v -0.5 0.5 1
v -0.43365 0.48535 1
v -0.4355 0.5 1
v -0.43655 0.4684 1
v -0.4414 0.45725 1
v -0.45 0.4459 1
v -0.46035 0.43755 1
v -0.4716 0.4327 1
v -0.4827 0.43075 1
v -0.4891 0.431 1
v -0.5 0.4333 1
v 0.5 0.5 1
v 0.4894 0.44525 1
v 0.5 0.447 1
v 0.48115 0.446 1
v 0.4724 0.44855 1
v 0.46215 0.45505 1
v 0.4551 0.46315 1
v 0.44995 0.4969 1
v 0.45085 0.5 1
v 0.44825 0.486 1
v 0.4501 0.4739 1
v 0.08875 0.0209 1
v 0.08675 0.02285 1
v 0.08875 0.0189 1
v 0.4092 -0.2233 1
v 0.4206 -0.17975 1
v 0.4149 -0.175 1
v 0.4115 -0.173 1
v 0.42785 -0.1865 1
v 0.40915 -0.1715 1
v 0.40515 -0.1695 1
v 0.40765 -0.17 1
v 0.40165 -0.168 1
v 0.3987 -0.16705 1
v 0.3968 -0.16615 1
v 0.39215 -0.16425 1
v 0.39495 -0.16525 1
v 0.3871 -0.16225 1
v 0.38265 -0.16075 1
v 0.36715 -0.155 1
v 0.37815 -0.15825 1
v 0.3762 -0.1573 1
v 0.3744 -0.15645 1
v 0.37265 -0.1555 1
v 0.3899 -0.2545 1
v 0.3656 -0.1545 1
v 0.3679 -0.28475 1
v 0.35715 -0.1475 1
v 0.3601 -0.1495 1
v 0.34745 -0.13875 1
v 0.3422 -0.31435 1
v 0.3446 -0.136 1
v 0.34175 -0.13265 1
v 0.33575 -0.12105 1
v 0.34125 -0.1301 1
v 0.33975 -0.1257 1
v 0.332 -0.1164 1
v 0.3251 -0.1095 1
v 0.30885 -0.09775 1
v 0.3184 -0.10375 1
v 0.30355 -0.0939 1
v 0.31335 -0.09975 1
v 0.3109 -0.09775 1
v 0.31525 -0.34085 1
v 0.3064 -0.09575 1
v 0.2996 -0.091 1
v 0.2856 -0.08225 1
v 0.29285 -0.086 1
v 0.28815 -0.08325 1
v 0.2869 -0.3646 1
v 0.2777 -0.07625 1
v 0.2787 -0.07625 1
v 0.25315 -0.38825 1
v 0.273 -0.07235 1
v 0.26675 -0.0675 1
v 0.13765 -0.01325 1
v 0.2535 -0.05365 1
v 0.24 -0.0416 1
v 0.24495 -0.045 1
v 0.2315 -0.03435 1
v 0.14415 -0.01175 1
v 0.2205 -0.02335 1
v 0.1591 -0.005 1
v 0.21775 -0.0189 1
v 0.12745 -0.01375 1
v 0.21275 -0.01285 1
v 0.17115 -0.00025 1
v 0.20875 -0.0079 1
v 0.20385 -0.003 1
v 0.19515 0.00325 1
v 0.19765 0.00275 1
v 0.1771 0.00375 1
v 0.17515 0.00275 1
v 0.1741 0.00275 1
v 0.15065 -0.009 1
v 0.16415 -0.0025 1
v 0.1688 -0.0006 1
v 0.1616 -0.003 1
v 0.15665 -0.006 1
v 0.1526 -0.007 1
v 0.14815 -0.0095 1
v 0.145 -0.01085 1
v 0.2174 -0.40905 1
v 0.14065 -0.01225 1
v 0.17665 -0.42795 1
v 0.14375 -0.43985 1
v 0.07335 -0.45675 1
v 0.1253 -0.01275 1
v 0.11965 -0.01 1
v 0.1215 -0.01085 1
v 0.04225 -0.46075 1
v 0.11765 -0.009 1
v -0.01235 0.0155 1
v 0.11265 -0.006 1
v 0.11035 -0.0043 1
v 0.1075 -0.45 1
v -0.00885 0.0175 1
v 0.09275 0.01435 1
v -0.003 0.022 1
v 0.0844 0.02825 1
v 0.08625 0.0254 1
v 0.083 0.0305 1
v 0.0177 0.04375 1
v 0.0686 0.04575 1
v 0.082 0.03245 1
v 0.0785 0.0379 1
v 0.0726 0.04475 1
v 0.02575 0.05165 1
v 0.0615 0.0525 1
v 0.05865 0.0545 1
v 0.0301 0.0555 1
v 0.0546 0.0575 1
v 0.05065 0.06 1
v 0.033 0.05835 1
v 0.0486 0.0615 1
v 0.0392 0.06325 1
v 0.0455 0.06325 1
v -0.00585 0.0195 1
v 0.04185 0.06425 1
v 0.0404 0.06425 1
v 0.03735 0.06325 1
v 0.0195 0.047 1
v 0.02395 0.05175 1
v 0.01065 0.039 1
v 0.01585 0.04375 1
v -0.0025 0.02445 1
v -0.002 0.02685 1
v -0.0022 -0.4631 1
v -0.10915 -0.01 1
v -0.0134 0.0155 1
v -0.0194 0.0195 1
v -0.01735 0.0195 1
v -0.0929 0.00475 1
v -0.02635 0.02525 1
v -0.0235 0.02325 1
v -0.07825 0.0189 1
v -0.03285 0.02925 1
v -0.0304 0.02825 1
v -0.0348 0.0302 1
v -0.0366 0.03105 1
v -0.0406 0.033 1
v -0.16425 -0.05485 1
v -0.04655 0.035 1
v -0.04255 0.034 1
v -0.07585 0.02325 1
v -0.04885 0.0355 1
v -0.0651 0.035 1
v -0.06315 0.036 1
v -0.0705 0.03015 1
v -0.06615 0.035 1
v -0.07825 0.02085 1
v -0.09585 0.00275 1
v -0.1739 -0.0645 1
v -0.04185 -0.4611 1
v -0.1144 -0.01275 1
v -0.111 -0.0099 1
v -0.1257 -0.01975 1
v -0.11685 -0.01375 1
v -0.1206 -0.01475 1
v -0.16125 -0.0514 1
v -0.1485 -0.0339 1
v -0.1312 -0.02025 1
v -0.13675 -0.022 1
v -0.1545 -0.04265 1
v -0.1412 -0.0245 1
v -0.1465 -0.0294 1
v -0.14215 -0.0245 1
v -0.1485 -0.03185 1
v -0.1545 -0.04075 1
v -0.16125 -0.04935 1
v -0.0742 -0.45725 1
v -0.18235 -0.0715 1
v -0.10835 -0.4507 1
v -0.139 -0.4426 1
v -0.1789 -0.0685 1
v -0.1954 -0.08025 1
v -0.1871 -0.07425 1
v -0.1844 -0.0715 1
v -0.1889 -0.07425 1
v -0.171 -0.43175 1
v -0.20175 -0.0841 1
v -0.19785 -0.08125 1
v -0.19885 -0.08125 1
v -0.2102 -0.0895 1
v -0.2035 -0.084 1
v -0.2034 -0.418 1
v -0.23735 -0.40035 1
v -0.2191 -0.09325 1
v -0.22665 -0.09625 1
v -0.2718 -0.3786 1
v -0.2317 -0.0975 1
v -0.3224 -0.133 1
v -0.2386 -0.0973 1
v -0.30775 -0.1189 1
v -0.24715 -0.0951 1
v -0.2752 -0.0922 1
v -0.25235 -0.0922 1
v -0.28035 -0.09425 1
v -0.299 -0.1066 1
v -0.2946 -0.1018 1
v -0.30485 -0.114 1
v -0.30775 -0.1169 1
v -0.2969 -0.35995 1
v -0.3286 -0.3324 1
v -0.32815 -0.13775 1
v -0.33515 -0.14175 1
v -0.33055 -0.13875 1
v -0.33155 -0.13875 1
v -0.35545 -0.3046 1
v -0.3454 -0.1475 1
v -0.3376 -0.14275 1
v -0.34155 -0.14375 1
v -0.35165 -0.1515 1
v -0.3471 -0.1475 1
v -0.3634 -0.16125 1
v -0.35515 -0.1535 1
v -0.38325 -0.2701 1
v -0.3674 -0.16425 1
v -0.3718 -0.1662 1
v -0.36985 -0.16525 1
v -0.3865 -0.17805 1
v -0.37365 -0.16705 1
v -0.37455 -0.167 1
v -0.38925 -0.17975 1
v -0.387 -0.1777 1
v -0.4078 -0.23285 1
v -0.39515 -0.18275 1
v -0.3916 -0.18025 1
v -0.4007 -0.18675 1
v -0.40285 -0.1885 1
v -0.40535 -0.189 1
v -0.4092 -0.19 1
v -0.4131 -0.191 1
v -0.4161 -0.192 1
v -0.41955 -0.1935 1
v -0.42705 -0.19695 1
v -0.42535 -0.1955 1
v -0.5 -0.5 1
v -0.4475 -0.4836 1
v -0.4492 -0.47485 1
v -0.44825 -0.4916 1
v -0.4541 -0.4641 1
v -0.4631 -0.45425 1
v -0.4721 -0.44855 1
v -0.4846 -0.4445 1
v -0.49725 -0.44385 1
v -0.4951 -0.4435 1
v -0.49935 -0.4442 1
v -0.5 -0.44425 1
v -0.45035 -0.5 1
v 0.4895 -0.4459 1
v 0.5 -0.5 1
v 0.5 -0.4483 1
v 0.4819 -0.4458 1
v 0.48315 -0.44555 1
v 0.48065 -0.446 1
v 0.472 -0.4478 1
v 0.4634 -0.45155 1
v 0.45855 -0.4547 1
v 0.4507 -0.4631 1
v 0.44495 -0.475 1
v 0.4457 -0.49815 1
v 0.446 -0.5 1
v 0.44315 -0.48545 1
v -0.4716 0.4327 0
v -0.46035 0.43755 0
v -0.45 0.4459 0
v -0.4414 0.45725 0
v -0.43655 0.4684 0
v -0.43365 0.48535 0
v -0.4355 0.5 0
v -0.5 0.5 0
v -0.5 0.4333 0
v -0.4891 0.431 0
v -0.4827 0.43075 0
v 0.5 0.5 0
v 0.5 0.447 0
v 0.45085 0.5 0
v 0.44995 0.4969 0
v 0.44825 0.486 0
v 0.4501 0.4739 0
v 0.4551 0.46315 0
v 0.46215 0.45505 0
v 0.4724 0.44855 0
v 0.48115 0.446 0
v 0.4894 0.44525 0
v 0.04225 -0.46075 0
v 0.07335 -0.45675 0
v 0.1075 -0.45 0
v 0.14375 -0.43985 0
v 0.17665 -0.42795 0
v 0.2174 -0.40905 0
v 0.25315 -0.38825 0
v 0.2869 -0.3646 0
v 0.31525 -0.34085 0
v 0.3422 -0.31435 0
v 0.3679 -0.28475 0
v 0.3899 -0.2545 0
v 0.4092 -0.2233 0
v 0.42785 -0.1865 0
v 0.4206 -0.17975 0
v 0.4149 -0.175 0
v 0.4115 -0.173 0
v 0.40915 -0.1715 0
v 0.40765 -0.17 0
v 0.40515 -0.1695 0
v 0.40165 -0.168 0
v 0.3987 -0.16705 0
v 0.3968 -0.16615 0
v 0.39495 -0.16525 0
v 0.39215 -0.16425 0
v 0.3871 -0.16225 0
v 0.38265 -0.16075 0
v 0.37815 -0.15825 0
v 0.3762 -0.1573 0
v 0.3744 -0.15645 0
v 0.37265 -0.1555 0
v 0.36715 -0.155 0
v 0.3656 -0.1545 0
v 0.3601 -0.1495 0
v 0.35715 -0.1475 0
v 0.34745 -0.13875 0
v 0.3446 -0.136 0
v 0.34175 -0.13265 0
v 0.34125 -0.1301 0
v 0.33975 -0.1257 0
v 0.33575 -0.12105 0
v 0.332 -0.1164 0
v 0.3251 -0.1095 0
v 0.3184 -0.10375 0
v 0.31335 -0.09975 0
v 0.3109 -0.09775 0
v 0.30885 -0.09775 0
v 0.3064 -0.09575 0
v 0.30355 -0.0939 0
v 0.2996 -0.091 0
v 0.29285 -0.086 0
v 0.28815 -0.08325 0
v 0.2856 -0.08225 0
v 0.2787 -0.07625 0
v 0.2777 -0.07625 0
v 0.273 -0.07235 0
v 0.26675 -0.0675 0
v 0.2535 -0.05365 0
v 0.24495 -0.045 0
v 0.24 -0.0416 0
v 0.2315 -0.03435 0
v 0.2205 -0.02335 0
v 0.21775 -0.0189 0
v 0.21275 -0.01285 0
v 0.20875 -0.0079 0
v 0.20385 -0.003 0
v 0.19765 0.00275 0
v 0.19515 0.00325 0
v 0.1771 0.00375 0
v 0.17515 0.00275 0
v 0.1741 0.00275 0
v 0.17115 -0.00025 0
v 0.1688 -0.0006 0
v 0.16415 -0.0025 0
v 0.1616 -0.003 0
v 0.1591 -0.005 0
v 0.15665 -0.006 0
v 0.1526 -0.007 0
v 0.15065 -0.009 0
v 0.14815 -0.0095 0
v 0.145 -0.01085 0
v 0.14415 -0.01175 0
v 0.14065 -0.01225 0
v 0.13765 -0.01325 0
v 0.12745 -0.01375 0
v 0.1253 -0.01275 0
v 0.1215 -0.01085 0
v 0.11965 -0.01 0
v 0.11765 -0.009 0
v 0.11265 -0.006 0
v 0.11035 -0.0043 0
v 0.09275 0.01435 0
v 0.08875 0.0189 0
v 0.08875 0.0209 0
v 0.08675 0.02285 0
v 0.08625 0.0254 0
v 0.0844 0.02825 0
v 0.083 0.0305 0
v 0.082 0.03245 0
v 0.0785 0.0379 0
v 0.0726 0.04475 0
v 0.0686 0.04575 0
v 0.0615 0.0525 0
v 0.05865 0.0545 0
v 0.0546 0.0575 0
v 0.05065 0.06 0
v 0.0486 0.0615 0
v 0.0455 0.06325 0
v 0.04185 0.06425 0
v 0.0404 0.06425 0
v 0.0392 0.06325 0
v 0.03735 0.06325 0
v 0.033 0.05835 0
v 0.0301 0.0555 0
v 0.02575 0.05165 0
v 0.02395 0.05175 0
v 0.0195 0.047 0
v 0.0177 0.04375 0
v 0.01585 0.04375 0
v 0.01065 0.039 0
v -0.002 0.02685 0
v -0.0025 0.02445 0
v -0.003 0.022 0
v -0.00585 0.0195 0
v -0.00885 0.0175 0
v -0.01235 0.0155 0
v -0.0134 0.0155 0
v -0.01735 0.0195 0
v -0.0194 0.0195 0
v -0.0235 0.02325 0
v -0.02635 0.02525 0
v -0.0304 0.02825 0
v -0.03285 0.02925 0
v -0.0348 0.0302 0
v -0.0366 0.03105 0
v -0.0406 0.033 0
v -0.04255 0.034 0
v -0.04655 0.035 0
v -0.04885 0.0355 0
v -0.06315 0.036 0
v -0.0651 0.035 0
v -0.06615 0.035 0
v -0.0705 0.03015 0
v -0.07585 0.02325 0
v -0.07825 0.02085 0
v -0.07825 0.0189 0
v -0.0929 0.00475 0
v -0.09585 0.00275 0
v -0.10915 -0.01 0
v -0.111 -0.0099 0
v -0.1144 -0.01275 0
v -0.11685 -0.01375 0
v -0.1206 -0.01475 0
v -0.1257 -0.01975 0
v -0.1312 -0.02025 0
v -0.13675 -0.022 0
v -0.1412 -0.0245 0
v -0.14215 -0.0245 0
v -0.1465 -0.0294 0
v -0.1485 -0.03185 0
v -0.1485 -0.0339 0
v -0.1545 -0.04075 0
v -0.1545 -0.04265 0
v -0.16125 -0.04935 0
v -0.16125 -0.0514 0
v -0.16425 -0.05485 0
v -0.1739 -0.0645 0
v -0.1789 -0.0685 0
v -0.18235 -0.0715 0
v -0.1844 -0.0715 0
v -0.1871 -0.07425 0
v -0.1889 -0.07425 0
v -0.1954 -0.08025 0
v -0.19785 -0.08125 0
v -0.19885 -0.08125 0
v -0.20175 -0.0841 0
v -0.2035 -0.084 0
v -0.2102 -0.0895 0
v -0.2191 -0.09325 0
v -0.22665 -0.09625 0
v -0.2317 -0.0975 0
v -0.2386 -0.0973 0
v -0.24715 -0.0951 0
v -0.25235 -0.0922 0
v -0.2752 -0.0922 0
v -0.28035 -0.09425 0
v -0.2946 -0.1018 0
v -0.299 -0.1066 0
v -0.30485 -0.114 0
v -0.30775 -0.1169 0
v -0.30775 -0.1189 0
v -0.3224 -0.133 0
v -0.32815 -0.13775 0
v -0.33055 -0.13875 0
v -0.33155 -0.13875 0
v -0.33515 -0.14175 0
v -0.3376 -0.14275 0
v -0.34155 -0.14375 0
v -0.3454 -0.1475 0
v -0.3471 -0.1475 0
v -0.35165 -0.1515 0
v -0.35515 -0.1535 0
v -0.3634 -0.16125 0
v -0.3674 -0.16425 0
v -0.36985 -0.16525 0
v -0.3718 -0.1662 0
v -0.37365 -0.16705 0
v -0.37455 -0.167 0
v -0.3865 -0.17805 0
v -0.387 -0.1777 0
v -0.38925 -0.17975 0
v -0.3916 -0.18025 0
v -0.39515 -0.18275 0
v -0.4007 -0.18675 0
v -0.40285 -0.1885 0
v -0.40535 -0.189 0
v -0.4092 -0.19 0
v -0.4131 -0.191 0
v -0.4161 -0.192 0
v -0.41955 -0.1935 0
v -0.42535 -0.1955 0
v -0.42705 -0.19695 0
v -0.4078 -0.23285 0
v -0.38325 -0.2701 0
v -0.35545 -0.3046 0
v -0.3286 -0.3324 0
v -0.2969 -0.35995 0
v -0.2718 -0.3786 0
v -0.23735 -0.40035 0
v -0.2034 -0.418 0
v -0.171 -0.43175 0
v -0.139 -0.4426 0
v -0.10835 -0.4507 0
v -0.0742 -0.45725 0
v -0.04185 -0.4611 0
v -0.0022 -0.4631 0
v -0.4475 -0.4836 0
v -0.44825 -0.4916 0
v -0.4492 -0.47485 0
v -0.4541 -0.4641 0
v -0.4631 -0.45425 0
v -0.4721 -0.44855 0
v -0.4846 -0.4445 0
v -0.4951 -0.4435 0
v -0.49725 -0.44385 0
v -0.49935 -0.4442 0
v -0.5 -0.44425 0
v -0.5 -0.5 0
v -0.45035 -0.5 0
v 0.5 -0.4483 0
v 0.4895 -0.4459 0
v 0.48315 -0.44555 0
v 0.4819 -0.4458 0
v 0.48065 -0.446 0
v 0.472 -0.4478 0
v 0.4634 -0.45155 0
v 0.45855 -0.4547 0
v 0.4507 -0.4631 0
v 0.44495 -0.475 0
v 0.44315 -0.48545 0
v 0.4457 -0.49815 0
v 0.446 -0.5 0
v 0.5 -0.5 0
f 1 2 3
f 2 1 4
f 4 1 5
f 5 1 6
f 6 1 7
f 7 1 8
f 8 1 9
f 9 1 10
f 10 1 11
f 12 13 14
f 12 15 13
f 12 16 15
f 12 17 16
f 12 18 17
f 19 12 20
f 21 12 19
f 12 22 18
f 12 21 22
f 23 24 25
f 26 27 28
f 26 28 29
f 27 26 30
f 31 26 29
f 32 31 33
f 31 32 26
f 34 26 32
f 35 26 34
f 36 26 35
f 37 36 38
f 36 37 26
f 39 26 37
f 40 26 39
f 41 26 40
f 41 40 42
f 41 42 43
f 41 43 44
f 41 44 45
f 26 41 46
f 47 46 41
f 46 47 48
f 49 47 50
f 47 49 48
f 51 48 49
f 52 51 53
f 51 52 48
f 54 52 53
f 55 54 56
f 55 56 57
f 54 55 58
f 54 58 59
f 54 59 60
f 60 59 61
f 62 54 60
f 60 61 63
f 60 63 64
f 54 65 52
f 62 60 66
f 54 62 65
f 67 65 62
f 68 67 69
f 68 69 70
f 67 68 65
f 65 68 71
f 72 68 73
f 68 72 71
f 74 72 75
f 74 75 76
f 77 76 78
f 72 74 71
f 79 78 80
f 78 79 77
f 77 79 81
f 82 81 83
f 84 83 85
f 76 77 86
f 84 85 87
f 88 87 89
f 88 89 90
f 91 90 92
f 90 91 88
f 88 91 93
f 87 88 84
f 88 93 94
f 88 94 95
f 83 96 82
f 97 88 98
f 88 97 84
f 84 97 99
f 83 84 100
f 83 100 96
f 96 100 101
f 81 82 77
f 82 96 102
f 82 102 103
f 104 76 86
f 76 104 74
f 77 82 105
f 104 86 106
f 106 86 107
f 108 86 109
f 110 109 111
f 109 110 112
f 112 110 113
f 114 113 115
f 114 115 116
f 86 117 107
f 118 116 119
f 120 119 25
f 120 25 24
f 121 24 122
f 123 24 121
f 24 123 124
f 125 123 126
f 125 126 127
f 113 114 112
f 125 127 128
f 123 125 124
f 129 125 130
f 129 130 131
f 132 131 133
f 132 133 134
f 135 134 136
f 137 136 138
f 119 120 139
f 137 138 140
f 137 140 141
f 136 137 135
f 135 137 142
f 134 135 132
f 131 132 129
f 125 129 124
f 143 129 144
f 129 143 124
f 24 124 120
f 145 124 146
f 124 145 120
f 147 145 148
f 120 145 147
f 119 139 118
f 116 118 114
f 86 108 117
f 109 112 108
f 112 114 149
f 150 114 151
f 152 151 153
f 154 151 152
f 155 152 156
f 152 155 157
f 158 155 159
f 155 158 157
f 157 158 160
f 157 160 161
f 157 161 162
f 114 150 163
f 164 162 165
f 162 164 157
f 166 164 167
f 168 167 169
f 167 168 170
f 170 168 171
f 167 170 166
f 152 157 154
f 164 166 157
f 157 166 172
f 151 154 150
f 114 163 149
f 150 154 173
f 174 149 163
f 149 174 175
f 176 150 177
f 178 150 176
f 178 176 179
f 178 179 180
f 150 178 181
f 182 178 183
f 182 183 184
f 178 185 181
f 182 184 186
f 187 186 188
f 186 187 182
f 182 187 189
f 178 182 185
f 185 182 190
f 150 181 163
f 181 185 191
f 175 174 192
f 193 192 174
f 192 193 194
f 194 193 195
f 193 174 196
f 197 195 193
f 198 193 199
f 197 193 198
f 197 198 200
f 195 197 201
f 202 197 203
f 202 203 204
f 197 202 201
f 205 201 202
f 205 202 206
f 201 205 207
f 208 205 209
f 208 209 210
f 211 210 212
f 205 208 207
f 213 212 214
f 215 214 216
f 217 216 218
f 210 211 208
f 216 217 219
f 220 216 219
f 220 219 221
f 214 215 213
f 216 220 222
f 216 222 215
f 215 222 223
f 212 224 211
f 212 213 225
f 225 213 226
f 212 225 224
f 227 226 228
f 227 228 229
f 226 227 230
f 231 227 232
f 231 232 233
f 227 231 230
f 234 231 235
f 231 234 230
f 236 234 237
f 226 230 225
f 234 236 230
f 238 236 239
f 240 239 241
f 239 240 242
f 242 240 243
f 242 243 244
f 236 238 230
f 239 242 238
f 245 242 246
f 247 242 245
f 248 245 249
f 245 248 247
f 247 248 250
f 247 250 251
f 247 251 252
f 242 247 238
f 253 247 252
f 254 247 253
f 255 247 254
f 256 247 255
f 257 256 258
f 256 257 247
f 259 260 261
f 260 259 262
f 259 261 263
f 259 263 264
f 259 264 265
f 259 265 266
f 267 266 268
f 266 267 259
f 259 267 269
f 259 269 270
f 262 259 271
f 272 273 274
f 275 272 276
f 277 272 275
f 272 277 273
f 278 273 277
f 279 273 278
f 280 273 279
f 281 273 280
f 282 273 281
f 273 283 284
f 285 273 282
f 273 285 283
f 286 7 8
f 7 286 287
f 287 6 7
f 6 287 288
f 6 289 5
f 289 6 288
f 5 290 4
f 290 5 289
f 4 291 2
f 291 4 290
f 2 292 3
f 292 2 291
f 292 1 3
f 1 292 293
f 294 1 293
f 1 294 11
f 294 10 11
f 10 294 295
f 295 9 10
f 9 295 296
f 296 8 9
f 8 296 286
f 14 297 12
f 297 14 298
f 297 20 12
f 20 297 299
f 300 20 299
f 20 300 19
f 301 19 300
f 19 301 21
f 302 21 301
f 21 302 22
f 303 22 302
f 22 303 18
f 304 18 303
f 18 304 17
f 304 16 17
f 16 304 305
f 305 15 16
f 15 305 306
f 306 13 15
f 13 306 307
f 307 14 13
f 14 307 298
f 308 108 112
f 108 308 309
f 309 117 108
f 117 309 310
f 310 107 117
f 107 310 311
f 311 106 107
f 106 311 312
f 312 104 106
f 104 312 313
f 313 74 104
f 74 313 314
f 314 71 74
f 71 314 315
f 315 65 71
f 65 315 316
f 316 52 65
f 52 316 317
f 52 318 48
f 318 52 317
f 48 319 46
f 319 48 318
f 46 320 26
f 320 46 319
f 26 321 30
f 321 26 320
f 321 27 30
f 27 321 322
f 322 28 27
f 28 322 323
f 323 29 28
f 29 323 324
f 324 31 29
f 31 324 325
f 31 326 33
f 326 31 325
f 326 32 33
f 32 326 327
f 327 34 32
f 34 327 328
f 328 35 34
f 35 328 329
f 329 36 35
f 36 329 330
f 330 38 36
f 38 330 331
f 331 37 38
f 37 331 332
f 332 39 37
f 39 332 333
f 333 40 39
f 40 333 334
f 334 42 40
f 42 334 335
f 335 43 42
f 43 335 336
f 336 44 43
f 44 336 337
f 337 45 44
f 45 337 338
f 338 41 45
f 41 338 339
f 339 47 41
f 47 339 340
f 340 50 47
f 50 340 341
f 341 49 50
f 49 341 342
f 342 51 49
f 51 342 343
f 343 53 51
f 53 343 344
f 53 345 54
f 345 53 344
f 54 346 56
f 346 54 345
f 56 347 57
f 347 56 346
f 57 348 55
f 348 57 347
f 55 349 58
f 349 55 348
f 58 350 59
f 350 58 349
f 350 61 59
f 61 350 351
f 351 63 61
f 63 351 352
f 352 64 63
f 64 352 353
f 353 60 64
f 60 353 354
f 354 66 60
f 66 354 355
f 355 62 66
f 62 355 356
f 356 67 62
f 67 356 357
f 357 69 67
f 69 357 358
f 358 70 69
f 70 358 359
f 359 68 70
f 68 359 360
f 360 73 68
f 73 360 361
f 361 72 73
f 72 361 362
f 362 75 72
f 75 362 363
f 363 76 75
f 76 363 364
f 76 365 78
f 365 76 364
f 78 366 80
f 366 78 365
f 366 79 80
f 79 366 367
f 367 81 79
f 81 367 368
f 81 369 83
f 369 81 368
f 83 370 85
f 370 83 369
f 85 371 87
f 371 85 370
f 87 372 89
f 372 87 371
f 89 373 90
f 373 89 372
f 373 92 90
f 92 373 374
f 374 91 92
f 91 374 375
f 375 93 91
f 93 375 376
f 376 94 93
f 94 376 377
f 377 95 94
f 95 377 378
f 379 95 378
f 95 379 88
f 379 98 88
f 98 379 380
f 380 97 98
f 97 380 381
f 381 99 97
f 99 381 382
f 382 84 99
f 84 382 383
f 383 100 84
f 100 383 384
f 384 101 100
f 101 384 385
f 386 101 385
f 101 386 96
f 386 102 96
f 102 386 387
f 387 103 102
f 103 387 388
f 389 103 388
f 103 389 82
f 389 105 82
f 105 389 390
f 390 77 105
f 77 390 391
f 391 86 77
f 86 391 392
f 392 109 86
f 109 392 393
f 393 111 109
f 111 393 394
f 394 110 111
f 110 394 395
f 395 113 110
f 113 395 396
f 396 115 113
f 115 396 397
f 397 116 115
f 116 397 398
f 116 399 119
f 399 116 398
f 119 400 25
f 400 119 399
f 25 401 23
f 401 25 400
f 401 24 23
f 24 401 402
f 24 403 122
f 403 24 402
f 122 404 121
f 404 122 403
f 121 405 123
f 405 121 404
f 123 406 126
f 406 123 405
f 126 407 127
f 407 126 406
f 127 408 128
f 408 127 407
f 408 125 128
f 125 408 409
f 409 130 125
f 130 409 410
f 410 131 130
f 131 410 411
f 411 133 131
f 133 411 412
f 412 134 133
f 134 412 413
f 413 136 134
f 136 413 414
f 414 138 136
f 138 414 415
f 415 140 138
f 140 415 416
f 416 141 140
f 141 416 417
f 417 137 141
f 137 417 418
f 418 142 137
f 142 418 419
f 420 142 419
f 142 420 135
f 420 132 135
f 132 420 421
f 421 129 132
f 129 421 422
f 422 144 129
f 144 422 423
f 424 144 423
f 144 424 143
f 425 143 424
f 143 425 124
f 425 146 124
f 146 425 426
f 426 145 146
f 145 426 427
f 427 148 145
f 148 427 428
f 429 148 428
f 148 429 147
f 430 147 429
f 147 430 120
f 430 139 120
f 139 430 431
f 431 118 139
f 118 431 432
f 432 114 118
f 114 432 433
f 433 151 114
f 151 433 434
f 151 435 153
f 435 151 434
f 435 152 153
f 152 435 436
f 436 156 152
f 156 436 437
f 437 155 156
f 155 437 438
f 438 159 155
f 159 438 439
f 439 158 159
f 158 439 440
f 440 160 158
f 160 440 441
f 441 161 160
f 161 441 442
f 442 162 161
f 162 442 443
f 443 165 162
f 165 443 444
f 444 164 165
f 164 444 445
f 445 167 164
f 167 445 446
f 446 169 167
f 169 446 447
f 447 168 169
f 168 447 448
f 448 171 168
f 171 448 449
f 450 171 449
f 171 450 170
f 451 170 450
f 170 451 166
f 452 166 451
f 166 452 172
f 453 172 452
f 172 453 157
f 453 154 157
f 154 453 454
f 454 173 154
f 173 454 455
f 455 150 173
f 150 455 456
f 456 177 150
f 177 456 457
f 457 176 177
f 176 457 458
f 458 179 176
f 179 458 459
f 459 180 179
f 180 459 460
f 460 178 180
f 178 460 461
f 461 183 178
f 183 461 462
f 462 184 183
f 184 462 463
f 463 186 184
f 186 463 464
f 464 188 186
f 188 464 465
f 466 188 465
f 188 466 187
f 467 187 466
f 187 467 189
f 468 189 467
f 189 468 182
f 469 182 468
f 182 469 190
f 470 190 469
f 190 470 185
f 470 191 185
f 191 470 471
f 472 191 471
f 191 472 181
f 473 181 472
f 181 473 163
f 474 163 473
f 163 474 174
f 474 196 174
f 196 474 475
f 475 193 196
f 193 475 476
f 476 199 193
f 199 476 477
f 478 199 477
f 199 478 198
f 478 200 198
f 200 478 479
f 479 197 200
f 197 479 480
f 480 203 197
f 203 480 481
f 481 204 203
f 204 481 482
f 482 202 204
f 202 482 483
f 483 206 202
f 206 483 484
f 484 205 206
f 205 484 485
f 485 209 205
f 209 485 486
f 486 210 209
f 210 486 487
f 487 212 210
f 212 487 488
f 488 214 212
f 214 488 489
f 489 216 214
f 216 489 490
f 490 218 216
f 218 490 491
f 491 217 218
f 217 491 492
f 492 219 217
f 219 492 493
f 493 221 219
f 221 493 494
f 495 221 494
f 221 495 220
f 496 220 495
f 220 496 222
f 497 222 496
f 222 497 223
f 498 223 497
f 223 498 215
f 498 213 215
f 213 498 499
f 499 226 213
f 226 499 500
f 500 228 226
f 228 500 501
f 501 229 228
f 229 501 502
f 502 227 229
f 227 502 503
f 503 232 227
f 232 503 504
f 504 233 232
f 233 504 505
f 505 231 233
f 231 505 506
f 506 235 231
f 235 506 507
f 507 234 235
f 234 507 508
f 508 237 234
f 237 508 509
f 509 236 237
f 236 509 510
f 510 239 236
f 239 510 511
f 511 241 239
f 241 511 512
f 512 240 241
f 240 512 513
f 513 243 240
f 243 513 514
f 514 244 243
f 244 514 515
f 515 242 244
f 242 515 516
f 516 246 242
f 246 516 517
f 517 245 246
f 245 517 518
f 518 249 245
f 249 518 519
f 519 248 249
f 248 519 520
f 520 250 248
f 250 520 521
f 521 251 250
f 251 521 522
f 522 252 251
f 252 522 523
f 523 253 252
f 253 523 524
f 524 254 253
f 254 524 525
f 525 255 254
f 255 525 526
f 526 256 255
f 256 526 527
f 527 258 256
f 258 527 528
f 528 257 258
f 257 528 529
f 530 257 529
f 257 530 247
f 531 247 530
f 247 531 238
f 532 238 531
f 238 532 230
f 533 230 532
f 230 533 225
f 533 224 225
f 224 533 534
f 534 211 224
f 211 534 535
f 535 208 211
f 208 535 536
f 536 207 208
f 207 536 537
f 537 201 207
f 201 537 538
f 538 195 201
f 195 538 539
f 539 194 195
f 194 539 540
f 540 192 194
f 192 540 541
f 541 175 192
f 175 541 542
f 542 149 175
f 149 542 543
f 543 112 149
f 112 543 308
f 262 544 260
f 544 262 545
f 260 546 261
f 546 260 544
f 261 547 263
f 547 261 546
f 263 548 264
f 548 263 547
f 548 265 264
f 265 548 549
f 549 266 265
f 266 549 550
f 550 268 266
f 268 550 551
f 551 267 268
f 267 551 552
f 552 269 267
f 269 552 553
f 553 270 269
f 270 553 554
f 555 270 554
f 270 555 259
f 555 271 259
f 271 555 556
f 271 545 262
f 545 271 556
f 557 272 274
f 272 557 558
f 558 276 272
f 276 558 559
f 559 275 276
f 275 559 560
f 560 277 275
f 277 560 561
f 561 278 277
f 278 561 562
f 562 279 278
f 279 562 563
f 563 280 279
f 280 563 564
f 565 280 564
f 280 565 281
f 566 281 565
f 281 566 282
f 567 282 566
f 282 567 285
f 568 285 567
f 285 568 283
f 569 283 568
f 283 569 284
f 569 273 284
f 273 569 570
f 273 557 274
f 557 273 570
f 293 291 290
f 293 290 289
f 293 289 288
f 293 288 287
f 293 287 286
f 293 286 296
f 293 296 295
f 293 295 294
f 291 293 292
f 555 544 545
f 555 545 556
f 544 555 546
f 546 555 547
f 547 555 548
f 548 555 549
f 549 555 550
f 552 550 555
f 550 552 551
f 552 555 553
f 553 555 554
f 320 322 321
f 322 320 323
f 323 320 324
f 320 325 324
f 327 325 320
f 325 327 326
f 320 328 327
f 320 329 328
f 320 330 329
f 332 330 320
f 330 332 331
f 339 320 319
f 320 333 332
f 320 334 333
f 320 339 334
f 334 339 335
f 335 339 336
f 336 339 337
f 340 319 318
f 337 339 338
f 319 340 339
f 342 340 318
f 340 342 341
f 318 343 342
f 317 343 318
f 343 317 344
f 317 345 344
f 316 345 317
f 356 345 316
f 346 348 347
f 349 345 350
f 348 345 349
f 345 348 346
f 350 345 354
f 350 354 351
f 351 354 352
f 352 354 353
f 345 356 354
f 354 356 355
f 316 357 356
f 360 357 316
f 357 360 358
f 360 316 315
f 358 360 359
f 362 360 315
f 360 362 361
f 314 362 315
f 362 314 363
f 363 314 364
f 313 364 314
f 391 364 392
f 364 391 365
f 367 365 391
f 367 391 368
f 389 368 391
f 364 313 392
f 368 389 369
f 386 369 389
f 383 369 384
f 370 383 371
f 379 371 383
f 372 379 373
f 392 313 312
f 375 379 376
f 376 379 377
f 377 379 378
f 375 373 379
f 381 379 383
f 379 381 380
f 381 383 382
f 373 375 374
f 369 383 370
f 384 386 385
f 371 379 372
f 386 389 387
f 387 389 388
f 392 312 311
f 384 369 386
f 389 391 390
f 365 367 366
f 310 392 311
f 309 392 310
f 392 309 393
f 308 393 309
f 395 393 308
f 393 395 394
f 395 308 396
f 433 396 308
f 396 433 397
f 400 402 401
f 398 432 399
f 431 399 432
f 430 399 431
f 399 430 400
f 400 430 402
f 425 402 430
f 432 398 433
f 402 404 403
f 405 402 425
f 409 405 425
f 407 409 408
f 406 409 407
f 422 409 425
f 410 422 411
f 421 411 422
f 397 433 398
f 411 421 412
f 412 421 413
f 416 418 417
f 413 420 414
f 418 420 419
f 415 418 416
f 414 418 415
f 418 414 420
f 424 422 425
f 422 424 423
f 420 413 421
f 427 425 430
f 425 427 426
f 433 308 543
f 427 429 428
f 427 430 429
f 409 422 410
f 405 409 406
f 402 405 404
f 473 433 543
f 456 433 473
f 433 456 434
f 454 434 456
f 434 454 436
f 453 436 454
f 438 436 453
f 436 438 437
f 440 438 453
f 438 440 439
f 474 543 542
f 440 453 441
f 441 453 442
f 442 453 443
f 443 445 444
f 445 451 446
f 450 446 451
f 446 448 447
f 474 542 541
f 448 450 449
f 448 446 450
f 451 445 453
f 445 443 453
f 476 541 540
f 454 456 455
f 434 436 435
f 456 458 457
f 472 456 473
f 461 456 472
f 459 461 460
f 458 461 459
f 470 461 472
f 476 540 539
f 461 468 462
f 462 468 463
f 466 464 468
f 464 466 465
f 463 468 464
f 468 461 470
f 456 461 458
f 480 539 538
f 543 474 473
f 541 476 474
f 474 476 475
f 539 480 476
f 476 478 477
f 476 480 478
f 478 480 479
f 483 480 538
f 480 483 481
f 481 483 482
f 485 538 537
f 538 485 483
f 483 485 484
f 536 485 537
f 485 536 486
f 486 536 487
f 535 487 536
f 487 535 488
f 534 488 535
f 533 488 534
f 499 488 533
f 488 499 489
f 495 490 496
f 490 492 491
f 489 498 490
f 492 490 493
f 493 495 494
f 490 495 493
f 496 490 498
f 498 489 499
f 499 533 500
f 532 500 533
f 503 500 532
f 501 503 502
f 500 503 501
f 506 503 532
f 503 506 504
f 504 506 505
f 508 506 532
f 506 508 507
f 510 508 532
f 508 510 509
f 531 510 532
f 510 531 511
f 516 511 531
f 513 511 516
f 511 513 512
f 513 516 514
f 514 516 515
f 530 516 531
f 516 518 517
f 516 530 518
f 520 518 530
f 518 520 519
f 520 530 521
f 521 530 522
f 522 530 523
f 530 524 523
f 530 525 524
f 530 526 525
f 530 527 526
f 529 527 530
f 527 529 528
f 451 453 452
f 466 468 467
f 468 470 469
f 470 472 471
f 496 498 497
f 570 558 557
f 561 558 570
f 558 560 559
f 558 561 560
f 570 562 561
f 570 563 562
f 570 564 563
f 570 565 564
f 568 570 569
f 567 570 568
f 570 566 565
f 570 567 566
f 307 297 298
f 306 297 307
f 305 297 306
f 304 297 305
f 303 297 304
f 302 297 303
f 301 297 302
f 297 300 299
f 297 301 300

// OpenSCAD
module mcGreen_1()
{
 /* Generated by trace2scad version 20150415
    http://aggregate.org/MAKE/TRACE2SCAD/
    Optimized model has 288/1529 original points
 */
 color([0.5, 0.5, 0.5])
 assign(minx=0) /* polygon minx=0 */
 assign(miny=0) /* polygon miny=0 */
 assign(maxx=20000) /* polygon maxx=20000 */
 assign(maxy=20000) /* polygon maxy=20000 */
 assign(dx=maxx-minx)
 assign(dy=maxy-miny)
 assign(maxd=((dx>dy)?dx:dy))
 scale([1/maxd, 1/maxd, 1])
 translate([-minx-dx/2, -miny-dy/2, 0])
 linear_extrude(height=1, convexity=288)
 union() {
  union() {
   polygon([[0,19333],[0,18666],[218,18620],[346,18615],[568,18654],[793,18751],[1000,18918],[1172,19145],[1269,19368],[1327,19707],[1290,20000],[0,20000]], convexity=5);
   polygon([[19008,19969],[18999,19938],[18965,19720],[19002,19478],[19102,19263],[19243,19101],[19448,18971],[19623,18920],[19788,18905],[20000,18940],[20000,20000],[19017,20000]], convexity=6);
   polygon([[10796,11275],[10784,11265],[10747,11265],[10660,11167],[10602,11110],[10515,11033],[10479,11035],[10390,10940],[10354,10875],[10317,10875],[10213,10780],[9960,10537],[9950,10489],[9940,10440],[9883,10390],[9823,10350],[9753,10310],[9732,10310],[9653,10390],[9612,10390],[9530,10465],[9473,10505],[9392,10565],[9343,10585],[9304,10604],[9268,10621],[9188,10660],[9149,10680],[9069,10700],[9023,10710],[8737,10720],[8698,10700],[8677,10700],[8590,10603],[8483,10465],[8435,10417],[8435,10378],[8142,10095],[8083,10055],[7817,9800],[7780,9802],[7712,9745],[7663,9725],[7588,9705],[7486,9605],[7376,9595],[7265,9560],[7176,9510],[7157,9510],[7070,9412],[7030,9363],[7030,9322],[6910,9185],[6910,9147],[6775,9013],[6775,8972],[6715,8903],[6522,8710],[6422,8630],[6353,8570],[6312,8570],[6258,8515],[6222,8515],[6092,8395],[6043,8375],[6023,8375],[5965,8318],[5930,8320],[5796,8210],[5618,8135],[5467,8075],[5366,8050],[5228,8054],[5057,8098],[4953,8156],[4496,8156],[4393,8115],[4108,7964],[4020,7868],[3903,7720],[3845,7662],[3845,7622],[3552,7340],[3437,7245],[3389,7225],[3369,7225],[3297,7165],[3248,7145],[3169,7125],[3092,7050],[3058,7050],[2967,6970],[2897,6930],[2732,6775],[2652,6715],[2603,6695],[2564,6676],[2527,6659],[2509,6660],[2270,6439],[2260,6446],[2215,6405],[2168,6395],[2097,6345],[1986,6265],[1943,6230],[1893,6220],[1816,6200],[1738,6180],[1678,6160],[1609,6130],[1493,6090],[1459,6061],[1844,5343],[2335,4598],[2891,3908],[3428,3352],[4062,2801],[4564,2428],[5253,1993],[5932,1640],[6580,1365],[7220,1148],[7833,986],[8516,855],[9163,778],[9956,738],[10845,785],[11467,865],[12150,1000],[12875,1203],[13533,1441],[14348,1819],[15063,2235],[15738,2708],[16305,3183],[16844,3713],[17358,4305],[17798,4910],[18184,5534],[18557,6270],[18412,6405],[18298,6500],[18230,6540],[18183,6570],[18153,6600],[18103,6610],[18033,6640],[17974,6659],[17936,6677],[17899,6695],[17843,6715],[17742,6755],[17653,6785],[17563,6835],[17524,6854],[17488,6871],[17453,6890],[17343,6900],[17312,6910],[17202,7010],[17143,7050],[16949,7225],[16892,7280],[16835,7347],[16825,7398],[16795,7486],[16715,7579],[16640,7672],[16502,7810],[16368,7925],[16267,8005],[16218,8045],[16177,8045],[16128,8085],[16071,8122],[15992,8180],[15857,8280],[15763,8335],[15712,8355],[15574,8475],[15554,8475],[15460,8553],[15335,8650],[15070,8927],[14899,9100],[14800,9168],[14630,9313],[14410,9533],[14355,9622],[14255,9743],[14175,9842],[14077,9940],[13953,10055],[13903,10065],[13542,10075],[13503,10055],[13482,10055],[13423,9995],[13376,9988],[13283,9950],[13232,9940],[13182,9900],[13133,9880],[13052,9860],[13013,9820],[12963,9810],[12900,9783],[12883,9765],[12813,9755],[12753,9735],[12549,9725],[12506,9745],[12430,9783],[12393,9800],[12353,9820],[12253,9880],[12207,9914],[11855,10287],[11775,10378],[11775,10418],[11735,10457],[11725,10508],[11688,10565],[11660,10610],[11640,10649],[11570,10758],[11452,10895],[11372,10915],[11230,11050],[11173,11090],[11092,11150],[11013,11200],[10972,11230],[10910,11265],[10837,11285],[10808,11285]], convexity=54);
   polygon([[55,1123],[13,1116],[0,1115],[0,0],[993,0],[1035,168],[1050,328],[1016,503],[918,718],[738,915],[558,1029],[308,1110],[98,1130]], convexity=6);
   polygon([[19638,1084],[19613,1080],[19440,1044],[19268,969],[19171,906],[19014,738],[18899,500],[18863,291],[18914,37],[18920,0],[20000,0],[20000,1034],[19790,1082],[19663,1089]], convexity=6);
  }
 }
}

module mcGreen()
{
 /* all layers combined, scaled to within a 1mm cube */
 scale([1, 1, 1/1])
 difference() {
  union() {
   scale([1,1,2]) translate([0,0,-0.5]) mcGreen_1();
  }
  translate([0,0,-2]) cube([2,2,4],center=true);
 }
}
mcGreen();
